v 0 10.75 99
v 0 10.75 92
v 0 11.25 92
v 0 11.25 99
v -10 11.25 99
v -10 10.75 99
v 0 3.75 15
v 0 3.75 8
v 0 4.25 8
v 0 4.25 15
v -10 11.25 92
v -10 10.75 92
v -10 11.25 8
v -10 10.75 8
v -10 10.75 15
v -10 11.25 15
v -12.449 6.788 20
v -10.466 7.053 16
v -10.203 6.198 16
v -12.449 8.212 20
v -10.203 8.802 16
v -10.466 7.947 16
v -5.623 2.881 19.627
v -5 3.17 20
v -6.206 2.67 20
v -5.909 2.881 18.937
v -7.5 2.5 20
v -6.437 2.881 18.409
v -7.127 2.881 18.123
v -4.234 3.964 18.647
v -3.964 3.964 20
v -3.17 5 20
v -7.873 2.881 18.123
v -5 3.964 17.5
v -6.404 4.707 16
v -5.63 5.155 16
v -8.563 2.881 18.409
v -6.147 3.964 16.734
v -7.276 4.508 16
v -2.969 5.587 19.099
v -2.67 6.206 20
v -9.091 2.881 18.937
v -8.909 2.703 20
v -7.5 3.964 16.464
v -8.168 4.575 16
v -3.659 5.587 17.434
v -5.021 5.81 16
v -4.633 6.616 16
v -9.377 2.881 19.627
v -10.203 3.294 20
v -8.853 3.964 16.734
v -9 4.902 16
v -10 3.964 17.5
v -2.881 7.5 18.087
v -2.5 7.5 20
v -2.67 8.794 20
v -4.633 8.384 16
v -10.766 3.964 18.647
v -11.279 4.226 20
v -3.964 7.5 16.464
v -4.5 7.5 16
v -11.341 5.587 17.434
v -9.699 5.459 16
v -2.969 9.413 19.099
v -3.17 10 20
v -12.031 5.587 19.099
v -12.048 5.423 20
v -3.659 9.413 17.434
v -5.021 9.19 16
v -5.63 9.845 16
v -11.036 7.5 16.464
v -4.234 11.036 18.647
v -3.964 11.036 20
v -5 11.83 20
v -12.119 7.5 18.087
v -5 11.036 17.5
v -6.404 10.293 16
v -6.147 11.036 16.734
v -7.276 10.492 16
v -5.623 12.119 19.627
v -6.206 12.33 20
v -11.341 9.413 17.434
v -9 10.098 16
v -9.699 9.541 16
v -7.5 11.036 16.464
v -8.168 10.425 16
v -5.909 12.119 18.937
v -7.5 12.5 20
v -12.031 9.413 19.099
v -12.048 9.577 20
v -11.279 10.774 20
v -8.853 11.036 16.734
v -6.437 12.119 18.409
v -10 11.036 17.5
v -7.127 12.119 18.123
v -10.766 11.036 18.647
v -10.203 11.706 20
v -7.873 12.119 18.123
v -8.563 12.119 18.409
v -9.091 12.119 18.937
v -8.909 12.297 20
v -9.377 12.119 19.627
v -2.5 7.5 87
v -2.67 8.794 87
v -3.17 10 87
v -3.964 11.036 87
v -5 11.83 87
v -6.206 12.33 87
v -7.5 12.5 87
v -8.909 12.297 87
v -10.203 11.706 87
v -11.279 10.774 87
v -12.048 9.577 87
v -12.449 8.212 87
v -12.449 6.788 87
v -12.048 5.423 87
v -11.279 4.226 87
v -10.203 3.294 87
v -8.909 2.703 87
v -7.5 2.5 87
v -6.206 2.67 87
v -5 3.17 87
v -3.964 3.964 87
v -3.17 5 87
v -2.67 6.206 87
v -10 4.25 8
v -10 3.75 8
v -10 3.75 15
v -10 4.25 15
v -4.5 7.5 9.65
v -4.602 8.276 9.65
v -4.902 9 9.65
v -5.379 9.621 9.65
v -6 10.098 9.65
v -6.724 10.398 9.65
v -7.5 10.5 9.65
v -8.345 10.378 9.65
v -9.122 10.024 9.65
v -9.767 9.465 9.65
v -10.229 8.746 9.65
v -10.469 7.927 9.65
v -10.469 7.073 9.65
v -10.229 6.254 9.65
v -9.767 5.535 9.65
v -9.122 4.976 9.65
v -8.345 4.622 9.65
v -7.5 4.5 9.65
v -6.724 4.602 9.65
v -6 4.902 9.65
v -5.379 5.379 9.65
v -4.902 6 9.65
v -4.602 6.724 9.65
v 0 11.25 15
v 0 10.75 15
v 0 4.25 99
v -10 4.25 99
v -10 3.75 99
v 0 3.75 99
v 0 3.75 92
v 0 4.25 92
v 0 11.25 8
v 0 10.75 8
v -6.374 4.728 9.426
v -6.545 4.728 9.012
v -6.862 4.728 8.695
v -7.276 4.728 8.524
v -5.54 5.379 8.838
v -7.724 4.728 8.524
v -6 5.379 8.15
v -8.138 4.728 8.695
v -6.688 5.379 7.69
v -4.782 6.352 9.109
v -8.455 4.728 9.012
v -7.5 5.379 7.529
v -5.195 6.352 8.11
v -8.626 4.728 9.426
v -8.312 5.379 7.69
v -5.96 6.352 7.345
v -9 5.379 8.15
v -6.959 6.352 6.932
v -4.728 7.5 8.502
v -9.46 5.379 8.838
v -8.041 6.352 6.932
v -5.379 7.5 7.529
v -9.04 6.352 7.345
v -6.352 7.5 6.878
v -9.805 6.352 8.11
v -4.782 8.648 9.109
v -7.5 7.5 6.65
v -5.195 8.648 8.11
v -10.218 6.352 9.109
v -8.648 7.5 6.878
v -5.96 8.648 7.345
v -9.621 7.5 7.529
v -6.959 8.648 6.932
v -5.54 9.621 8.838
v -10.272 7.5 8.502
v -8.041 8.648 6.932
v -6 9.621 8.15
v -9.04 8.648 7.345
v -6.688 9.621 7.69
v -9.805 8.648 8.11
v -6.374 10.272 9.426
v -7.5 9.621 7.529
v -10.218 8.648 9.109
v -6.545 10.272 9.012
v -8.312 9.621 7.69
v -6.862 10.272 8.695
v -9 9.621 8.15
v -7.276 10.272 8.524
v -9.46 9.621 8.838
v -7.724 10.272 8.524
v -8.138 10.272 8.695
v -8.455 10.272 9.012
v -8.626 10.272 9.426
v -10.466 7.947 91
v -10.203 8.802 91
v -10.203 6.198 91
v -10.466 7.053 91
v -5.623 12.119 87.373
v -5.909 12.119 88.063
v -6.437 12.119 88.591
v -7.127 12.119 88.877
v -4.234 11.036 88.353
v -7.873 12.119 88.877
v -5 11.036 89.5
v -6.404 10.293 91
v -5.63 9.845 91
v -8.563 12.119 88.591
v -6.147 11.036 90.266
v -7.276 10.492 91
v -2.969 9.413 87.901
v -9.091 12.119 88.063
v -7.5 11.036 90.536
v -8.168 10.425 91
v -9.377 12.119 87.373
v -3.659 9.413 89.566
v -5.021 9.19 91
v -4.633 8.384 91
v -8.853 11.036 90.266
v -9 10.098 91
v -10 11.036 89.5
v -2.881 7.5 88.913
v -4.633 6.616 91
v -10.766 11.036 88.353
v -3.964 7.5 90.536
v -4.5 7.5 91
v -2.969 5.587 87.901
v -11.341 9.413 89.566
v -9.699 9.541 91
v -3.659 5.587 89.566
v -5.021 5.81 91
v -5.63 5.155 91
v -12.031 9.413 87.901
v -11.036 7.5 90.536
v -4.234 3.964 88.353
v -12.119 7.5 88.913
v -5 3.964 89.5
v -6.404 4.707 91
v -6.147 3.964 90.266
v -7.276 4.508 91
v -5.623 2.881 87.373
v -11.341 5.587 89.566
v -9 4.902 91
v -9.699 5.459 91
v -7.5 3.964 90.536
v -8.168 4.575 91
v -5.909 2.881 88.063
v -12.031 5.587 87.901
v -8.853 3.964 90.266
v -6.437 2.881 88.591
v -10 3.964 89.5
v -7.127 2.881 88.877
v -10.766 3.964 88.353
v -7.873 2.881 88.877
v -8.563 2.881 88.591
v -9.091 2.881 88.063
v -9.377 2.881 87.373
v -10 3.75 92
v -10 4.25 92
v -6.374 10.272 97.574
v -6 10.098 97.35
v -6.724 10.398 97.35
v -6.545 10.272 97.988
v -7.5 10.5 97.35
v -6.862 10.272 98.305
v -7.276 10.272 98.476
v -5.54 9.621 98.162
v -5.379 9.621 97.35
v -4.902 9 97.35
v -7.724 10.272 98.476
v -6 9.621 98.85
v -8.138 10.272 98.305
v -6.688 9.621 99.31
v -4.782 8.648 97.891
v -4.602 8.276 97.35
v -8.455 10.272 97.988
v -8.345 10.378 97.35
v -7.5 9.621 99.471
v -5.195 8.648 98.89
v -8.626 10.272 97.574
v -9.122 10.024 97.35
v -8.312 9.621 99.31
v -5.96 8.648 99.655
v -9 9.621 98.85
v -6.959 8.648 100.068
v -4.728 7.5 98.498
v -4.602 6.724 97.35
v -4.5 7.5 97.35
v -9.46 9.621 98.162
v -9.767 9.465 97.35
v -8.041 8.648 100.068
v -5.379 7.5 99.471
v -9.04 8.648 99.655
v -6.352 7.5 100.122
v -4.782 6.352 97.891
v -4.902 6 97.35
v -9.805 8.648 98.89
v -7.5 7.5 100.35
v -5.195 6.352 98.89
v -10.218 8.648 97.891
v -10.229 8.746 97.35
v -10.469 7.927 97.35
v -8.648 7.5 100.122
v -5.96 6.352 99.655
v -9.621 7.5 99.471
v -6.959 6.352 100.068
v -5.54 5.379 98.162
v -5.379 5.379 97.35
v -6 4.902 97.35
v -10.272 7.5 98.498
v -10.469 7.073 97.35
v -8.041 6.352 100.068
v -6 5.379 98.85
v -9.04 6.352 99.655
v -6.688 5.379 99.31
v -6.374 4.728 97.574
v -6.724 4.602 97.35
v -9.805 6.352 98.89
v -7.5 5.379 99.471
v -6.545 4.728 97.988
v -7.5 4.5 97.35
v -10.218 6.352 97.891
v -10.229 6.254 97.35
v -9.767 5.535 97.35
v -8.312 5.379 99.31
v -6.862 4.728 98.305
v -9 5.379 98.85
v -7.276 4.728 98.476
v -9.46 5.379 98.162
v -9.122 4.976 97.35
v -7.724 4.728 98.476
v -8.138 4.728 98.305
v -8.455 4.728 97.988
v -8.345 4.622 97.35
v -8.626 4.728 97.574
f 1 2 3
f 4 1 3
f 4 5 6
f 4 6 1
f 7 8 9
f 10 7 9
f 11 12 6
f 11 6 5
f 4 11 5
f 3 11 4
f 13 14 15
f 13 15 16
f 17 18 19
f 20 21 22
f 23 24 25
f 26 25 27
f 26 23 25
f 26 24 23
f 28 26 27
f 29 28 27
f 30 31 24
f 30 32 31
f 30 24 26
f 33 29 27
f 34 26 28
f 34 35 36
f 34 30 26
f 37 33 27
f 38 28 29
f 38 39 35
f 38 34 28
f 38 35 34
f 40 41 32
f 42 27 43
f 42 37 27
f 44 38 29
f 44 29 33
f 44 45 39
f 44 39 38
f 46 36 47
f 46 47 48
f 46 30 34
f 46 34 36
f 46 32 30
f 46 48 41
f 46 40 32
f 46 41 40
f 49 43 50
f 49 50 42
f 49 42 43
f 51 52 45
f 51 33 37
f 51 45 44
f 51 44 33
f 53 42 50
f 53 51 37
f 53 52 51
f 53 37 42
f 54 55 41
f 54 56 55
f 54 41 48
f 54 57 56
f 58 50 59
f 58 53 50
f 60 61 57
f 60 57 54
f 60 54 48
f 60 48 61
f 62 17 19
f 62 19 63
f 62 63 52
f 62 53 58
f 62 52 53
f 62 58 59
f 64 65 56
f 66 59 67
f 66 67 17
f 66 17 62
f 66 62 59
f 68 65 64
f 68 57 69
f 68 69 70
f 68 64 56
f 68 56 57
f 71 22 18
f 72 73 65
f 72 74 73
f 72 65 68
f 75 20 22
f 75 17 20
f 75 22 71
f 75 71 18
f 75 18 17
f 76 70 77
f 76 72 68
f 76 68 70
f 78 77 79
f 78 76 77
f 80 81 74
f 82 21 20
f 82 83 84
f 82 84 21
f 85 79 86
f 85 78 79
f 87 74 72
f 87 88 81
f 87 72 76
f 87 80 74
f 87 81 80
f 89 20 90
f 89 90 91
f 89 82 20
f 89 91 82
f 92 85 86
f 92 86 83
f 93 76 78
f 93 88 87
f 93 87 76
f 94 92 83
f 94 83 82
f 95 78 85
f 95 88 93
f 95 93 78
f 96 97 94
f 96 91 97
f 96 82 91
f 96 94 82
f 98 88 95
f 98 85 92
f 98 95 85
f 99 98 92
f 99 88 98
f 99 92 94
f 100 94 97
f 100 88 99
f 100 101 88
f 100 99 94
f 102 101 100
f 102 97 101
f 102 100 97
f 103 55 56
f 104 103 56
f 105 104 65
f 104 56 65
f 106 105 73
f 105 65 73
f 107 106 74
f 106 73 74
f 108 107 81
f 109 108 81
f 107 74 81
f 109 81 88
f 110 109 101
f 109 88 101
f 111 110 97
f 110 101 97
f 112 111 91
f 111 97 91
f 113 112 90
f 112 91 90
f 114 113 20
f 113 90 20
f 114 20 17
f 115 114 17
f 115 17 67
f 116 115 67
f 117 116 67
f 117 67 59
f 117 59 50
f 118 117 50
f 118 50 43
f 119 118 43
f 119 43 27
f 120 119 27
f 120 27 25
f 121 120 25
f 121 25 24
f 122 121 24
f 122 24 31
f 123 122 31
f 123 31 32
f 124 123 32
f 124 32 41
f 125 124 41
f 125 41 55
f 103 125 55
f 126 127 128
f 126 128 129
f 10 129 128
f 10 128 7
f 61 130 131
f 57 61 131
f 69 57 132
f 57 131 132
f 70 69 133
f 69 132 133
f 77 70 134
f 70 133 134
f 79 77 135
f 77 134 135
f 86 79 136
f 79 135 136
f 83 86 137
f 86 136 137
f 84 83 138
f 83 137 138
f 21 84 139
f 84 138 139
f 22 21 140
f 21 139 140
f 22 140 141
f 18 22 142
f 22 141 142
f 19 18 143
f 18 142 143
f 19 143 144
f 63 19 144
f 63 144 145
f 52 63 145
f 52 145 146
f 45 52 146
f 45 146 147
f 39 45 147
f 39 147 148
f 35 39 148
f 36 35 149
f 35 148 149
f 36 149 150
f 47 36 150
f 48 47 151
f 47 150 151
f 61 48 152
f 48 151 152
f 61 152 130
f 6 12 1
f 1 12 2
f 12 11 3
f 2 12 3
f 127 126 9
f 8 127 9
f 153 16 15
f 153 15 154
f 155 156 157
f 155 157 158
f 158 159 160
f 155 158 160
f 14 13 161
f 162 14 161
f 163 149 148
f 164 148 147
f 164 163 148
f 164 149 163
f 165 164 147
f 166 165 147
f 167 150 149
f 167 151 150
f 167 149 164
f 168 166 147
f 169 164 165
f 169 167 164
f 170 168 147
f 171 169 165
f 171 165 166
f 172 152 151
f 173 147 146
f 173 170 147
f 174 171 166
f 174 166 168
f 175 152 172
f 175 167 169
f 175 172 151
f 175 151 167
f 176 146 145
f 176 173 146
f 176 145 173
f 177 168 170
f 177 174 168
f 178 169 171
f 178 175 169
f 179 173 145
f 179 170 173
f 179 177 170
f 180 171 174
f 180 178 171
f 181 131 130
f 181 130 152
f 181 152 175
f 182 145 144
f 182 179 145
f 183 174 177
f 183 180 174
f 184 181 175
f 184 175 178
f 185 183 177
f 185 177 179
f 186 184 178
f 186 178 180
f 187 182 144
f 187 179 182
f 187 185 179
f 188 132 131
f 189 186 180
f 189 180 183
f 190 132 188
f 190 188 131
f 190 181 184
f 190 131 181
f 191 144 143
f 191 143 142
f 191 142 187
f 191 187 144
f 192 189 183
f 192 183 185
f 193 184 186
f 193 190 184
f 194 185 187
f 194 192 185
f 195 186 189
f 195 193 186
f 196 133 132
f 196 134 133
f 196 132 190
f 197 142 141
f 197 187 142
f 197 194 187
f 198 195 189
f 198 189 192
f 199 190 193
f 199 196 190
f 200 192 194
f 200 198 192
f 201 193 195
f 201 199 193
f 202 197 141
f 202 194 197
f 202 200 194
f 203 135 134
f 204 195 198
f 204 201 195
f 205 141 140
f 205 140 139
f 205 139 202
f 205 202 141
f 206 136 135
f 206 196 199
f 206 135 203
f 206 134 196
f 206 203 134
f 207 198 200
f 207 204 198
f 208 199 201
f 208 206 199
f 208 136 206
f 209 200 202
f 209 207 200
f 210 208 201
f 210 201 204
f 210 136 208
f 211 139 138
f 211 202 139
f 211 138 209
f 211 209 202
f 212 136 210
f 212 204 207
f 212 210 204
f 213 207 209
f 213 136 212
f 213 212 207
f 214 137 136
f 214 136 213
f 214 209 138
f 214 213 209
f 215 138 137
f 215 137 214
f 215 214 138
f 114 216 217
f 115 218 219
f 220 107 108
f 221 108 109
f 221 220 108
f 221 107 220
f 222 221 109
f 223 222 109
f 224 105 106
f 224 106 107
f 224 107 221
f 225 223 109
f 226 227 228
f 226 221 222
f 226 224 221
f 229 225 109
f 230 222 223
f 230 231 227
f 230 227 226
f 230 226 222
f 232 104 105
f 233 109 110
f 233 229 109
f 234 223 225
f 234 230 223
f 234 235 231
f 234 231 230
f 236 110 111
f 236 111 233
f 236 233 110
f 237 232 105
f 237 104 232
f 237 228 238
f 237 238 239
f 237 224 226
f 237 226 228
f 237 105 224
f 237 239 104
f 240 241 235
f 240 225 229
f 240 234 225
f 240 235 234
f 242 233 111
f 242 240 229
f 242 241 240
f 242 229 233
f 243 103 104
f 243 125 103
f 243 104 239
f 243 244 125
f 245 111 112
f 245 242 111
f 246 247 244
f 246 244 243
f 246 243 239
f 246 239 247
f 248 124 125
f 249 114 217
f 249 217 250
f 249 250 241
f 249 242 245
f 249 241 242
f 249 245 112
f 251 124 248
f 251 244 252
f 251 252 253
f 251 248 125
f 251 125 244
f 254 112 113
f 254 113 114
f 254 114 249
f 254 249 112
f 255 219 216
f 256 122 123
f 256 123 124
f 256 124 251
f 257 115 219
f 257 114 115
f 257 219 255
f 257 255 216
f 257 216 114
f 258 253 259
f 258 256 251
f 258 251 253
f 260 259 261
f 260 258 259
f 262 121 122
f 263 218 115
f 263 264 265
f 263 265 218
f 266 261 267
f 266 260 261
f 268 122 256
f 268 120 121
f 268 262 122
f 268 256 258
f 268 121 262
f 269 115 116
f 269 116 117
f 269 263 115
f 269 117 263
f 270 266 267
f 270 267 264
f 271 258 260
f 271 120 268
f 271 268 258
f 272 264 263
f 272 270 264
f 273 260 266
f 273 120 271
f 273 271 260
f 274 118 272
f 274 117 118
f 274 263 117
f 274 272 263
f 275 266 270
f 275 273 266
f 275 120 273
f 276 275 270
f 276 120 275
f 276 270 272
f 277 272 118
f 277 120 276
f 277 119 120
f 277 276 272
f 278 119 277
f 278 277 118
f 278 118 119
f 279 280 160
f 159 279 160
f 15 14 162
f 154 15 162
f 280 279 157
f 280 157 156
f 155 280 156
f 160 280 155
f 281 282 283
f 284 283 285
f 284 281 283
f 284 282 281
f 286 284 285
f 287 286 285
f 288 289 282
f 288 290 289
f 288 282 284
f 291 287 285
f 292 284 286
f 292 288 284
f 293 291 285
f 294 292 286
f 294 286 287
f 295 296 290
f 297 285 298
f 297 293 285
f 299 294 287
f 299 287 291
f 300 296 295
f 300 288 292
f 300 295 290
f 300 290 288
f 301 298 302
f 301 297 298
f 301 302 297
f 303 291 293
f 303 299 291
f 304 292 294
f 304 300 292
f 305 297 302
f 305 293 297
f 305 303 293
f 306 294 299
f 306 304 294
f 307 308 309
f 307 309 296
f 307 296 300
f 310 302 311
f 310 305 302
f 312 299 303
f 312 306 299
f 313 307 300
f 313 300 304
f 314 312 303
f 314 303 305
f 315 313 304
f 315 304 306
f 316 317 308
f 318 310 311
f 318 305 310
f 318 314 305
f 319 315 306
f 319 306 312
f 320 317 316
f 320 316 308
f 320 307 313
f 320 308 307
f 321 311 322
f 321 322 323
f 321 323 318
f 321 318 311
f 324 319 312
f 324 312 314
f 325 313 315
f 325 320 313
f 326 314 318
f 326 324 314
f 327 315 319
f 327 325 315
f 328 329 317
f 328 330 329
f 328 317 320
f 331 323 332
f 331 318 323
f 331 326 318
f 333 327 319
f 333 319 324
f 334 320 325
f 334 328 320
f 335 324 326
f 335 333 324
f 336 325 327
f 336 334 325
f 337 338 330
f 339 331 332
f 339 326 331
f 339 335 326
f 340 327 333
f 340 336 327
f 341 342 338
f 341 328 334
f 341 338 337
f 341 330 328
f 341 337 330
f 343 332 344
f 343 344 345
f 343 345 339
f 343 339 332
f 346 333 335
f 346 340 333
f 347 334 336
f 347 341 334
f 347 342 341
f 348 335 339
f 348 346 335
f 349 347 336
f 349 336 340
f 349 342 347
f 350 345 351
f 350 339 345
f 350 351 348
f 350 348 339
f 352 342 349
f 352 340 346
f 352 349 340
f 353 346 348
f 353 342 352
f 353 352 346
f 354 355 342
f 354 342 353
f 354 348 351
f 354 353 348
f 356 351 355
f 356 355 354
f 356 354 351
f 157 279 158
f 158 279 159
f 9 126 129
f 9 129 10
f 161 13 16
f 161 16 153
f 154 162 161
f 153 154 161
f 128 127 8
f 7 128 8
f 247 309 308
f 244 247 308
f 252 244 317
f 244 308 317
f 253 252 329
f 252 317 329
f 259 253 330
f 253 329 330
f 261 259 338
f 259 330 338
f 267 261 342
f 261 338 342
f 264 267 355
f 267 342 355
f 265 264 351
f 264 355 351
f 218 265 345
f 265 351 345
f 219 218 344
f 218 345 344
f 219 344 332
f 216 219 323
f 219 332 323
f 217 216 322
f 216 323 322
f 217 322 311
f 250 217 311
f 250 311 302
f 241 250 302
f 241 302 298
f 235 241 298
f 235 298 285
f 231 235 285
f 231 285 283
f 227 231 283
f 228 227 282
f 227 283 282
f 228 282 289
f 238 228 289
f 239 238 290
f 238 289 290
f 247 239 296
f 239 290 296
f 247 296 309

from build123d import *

# Parameters (mm, degrees)
SPHERE_ANGLE              = 180
SPHERE001_ANGLE           = 180
SPHERE002_ANGLE           = 180
CYLINDER003_R             = 3
CYLINDER003_DEPTH         = 6.35
SPHERE003_ANGLE           = 180
CYLINDER004_R             = 3
CYLINDER004_DEPTH         = 6.35
FUSION001_PLACEMENT_ANGLE = 180
BOX002_W                  = 10
BOX002_H                  = 0.5
BOX002_DEPTH              = 7
BOX001_W                  = 10
BOX001_H                  = 0.5
BOX001_DEPTH              = 7
BOX004_W                  = 10
BOX004_H                  = 0.5
BOX004_DEPTH              = 7
BOX003_W                  = 10
BOX003_H                  = 0.5
BOX003_DEPTH              = 7
CYLINDER_R                = 5
CYLINDER_DEPTH            = 67


with BuildPart() as sphere:
    # Sphere → Sphere (revolve)
    with BuildSketch(Plane(origin=(-7.5, 7.5, 20), x_dir=(1, 0, 0), z_dir=(0, 0, 1))):
        with BuildLine():
            ThreePointArc((0, -5), (5, 0), (0, 5))
            Line((0, 5), (0, -5))
        make_face()
    revolve(axis=Axis((-7.5, 7.5, 20), (0, 1, 0)), revolution_arc=SPHERE_ANGLE)


with BuildPart() as sphere001:
    # Sphere001 → Sphere001 (revolve)
    with BuildSketch(Plane(origin=(-7.5, 7.5, 87), x_dir=(1, 0, 0), z_dir=(0, 0, -1))):
        with BuildLine():
            ThreePointArc((0, -5), (5, 0), (0, 5))
            Line((0, 5), (0, -5))
        make_face()
    revolve(axis=Axis((-7.5, 7.5, 87), (0, -1, 0)), revolution_arc=SPHERE001_ANGLE)


with BuildPart() as sphere002:
    # Sphere002 → Sphere002 (revolve)
    with BuildSketch(Plane(origin=(-7.5, 7.5, 9.65), x_dir=(1, 0, 0), z_dir=(0, 0, 1))):
        with BuildLine():
            ThreePointArc((0, -3), (3, 0), (0, 3))
            Line((0, 3), (0, -3))
        make_face()
    revolve(axis=Axis((-7.5, 7.5, 9.65), (0, 1, 0)), revolution_arc=SPHERE002_ANGLE)


with BuildPart() as bottomend:
    # Cylinder003 → Cylinder003 (new body)
    with BuildSketch(Plane(origin=(-7.5, 7.5, 9.65), x_dir=(1, 0, 0), z_dir=(0, 0, 1))):
        Circle(CYLINDER003_R)
    extrude(amount=CYLINDER003_DEPTH)

    # Fusion: union Sphere002
    add(sphere002.part)


with BuildPart() as sphere003:
    # Sphere003 → Sphere003 (revolve)
    with BuildSketch(Plane(origin=(-7.5, 7.5, 9.65), x_dir=(1, 0, 0), z_dir=(0, 0, 1))):
        with BuildLine():
            ThreePointArc((0, -3), (3, 0), (0, 3))
            Line((0, 3), (0, -3))
        make_face()
    revolve(axis=Axis((-7.5, 7.5, 9.65), (0, 1, 0)), revolution_arc=SPHERE003_ANGLE)


with BuildPart() as topend:
    # Cylinder004 → Cylinder004 (new body)
    with BuildSketch(Plane(origin=(-7.5, 7.5, 9.65), x_dir=(1, 0, 0), z_dir=(0, 0, 1))):
        Circle(CYLINDER004_R)
    extrude(amount=CYLINDER004_DEPTH)

    # Fusion001: union Sphere003
    add(sphere003.part)


with BuildPart() as topend_1:
    # Fusion001 placement: moved
    add(topend.part.moved(Location((0, 15, 107))).rotate(Axis((0, 15, 107), (1, 0, 0)), FUSION001_PLACEMENT_ANGLE))


with BuildPart() as cube001:
    # Box002 → Box002 (new body)
    with BuildSketch(Plane(origin=(-10, 10.75, 8), x_dir=(1, 0, 0), z_dir=(0, 0, 1))):
        with Locations((5, 0.25)):
            Rectangle(BOX002_W, BOX002_H)
    extrude(amount=BOX002_DEPTH)


with BuildPart() as bottom_tubehold:
    # Box001 → Box001 (new body)
    with BuildSketch(Plane(origin=(-10, 3.75, 8), x_dir=(1, 0, 0), z_dir=(0, 0, 1))):
        with Locations((5, 0.25)):
            Rectangle(BOX001_W, BOX001_H)
    extrude(amount=BOX001_DEPTH)

    # Fusion002: union Cube001
    add(cube001.part)


with BuildPart() as cube003:
    # Box004 → Box004 (new body)
    with BuildSketch(Plane(origin=(-10, 10.75, 92), x_dir=(1, 0, 0), z_dir=(0, 0, 1))):
        with Locations((5, 0.25)):
            Rectangle(BOX004_W, BOX004_H)
    extrude(amount=BOX004_DEPTH)


with BuildPart() as top_tubehold:
    # Box003 → Box003 (new body)
    with BuildSketch(Plane(origin=(-10, 3.75, 92), x_dir=(1, 0, 0), z_dir=(0, 0, 1))):
        with Locations((5, 0.25)):
            Rectangle(BOX003_W, BOX003_H)
    extrude(amount=BOX003_DEPTH)

    # Fusion003: union Cube003
    add(cube003.part)


with BuildPart() as tube003:
    # Cylinder → Cylinder (new body)
    with BuildSketch(Plane(origin=(-7.5, 7.5, 20), x_dir=(1, 0, 0), z_dir=(0, 0, 1))):
        Circle(CYLINDER_R)
    extrude(amount=CYLINDER_DEPTH)

    # Fusion005: union Sphere, Sphere001, bottomend, topend, bottom_tubehold, top_tubehold
    add(sphere.part)
    add(sphere001.part)
    add(bottomend.part)
    add(topend_1.part)
    add(bottom_tubehold.part)
    add(top_tubehold.part)


solid = tube003.part
